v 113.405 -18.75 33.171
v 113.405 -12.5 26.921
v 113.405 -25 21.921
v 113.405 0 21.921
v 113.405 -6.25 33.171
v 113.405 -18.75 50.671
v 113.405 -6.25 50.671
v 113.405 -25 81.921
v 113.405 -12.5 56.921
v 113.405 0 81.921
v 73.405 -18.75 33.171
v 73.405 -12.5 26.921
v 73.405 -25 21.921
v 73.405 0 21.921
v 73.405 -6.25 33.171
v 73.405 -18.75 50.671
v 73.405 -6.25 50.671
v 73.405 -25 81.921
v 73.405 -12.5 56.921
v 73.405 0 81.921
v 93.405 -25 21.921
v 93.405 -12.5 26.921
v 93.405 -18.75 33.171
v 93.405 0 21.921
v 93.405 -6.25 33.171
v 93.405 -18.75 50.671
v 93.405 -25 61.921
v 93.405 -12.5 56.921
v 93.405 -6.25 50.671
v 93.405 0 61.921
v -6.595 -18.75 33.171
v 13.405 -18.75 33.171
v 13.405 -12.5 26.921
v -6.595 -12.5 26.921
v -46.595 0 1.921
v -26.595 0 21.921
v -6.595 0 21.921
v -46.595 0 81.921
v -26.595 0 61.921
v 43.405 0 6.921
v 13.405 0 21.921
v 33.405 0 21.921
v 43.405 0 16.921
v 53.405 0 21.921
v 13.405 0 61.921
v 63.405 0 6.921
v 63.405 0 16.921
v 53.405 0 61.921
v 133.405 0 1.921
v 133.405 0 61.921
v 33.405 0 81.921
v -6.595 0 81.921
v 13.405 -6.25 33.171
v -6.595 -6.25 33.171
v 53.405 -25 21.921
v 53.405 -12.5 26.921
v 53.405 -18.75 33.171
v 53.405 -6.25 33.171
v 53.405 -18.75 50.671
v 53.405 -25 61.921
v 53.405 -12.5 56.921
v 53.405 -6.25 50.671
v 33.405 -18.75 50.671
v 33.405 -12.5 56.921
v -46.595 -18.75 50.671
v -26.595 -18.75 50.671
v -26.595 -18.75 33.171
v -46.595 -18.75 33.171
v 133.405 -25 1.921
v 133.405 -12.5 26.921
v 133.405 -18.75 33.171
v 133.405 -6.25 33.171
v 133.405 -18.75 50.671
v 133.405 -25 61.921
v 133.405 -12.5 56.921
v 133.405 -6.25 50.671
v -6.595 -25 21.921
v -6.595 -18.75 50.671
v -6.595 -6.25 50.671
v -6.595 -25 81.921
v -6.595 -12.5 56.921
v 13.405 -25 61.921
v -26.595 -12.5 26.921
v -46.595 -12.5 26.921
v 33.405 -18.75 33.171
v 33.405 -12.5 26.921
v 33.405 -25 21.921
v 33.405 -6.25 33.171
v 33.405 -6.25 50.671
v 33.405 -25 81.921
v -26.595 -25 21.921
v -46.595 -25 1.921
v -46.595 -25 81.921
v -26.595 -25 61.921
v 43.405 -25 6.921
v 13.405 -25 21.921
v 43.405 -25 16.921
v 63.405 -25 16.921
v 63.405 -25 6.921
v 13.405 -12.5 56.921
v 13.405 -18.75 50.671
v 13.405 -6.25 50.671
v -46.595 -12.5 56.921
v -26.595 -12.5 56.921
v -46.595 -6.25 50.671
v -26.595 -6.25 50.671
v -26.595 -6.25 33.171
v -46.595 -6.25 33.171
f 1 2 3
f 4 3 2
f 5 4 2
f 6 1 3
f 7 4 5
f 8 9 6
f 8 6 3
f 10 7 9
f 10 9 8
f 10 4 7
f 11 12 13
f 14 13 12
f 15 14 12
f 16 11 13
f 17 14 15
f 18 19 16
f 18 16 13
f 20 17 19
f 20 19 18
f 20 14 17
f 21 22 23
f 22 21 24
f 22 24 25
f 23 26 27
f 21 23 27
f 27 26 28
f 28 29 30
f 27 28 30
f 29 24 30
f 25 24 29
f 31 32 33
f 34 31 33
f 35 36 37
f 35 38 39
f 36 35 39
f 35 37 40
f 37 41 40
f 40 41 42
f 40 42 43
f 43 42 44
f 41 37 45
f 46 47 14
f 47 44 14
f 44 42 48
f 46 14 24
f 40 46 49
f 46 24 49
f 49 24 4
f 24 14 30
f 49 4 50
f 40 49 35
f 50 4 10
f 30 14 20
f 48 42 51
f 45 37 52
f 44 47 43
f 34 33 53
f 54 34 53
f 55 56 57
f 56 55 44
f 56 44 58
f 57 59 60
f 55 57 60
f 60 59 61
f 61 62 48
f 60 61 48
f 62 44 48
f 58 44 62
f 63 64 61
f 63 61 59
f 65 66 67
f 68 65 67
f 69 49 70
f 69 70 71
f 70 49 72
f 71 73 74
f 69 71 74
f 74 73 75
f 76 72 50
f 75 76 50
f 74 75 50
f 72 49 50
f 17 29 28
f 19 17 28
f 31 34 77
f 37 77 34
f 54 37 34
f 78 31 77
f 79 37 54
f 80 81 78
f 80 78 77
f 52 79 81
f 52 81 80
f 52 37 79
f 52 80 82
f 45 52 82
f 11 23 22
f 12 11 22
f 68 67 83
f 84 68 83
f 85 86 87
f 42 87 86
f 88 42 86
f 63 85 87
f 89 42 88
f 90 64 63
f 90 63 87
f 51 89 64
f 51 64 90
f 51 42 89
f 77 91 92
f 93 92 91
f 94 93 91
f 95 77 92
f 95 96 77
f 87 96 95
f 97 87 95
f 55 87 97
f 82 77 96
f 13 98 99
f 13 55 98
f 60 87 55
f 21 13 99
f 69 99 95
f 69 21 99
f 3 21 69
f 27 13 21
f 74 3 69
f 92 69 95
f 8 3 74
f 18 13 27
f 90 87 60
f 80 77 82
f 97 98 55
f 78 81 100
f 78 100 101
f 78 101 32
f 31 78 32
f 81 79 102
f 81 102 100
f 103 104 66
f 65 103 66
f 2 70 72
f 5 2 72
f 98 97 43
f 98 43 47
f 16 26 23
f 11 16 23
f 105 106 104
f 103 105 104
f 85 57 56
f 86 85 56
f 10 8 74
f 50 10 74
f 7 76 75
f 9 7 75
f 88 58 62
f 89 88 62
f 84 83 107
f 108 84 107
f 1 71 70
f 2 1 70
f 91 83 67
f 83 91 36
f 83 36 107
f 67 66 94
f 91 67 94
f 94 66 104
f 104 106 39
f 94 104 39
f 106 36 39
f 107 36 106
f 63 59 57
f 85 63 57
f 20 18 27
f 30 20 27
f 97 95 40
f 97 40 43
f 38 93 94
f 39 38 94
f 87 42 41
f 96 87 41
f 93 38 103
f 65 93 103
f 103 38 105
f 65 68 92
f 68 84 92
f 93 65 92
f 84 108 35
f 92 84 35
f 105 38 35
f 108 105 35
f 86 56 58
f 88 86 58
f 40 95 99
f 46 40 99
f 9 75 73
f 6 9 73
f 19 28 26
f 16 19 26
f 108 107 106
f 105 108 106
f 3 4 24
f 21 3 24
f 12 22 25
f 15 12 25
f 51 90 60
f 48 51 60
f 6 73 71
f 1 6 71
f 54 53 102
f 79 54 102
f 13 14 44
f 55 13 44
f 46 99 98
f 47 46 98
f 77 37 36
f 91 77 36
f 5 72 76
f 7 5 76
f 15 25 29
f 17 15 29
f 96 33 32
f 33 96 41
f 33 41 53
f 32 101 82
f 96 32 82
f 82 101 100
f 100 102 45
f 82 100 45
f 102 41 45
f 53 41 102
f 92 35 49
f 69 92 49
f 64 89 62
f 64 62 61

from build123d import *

# Parameters (mm, degrees)
F0_W     = 20
F0_H     = 60
F1_DEPTH = 25
F3_DEPTH = 180.001
F5_DEPTH = 25.001
F6_W     = 20
F6_H     = 10
F7_DEPTH = 25.001


with BuildPart() as f1:
    # F0 (on Front) → F1 (new body)
    with BuildSketch(Plane.XZ):
        Polygon((-46.595383, 21.920689), (-46.595383, 1.920689), (133.404617, 1.920689), (133.404617, 21.920689), (113.404617, 21.920689), (93.404617, 21.920689), (73.404617, 21.920689), (53.404617, 21.920689), (33.404617, 21.920689), (13.404617, 21.920689), (-6.595383, 21.920689), (-26.595383, 21.920689), align=None)
        with Locations((-36.595383, 51.920689)):
            Rectangle(F0_W, F0_H)
        with Locations((123.404617, 51.920689)):
            Rectangle(F0_W, F0_H)
        with Locations((3.404617, 51.920689)):
            Rectangle(F0_W, F0_H)
        with Locations((83.404617, 51.920689)):
            Rectangle(F0_W, F0_H)
        with Locations((43.404617, 51.920689)):
            Rectangle(F0_W, F0_H)
    extrude(amount=F1_DEPTH)

    # F2 (on face) → F3 (cut, through all)
    with BuildSketch(Plane.YZ.offset(133.404617)):
        Polygon((-18.75, 50.670689), (-18.75, 33.170689), (-12.5, 26.920689), (-6.25, 33.170689), (-6.25, 50.670689), (-12.5, 56.920689), align=None)
    extrude(amount=-F3_DEPTH, mode=Mode.SUBTRACT)

    # F4 (on face) → F5 (cut, through all)
    with BuildSketch(Plane.XZ.offset(25)):
        Polygon((-26.595383, 81.920689), (-46.595383, 81.920689), (-26.595383, 61.920689), align=None)
        Polygon((13.404617, 81.920689), (-6.595383, 81.920689), (13.404617, 61.920689), align=None)
        Polygon((53.404617, 81.920689), (33.404617, 81.920689), (53.404617, 61.920689), align=None)
        Polygon((93.404617, 81.920689), (73.404617, 81.920689), (93.404617, 61.920689), align=None)
        Polygon((133.404617, 81.920689), (113.404617, 81.920689), (133.404617, 61.920689), align=None)
    extrude(amount=-F5_DEPTH, mode=Mode.SUBTRACT)

    # F6 (on face) → F7 (cut, through all)
    with BuildSketch(Plane.XZ.offset(25)):
        with Locations((53.404617, 11.920689)):
            Rectangle(F6_W, F6_H)
    extrude(amount=-F7_DEPTH, mode=Mode.SUBTRACT)


solid = f1.part
